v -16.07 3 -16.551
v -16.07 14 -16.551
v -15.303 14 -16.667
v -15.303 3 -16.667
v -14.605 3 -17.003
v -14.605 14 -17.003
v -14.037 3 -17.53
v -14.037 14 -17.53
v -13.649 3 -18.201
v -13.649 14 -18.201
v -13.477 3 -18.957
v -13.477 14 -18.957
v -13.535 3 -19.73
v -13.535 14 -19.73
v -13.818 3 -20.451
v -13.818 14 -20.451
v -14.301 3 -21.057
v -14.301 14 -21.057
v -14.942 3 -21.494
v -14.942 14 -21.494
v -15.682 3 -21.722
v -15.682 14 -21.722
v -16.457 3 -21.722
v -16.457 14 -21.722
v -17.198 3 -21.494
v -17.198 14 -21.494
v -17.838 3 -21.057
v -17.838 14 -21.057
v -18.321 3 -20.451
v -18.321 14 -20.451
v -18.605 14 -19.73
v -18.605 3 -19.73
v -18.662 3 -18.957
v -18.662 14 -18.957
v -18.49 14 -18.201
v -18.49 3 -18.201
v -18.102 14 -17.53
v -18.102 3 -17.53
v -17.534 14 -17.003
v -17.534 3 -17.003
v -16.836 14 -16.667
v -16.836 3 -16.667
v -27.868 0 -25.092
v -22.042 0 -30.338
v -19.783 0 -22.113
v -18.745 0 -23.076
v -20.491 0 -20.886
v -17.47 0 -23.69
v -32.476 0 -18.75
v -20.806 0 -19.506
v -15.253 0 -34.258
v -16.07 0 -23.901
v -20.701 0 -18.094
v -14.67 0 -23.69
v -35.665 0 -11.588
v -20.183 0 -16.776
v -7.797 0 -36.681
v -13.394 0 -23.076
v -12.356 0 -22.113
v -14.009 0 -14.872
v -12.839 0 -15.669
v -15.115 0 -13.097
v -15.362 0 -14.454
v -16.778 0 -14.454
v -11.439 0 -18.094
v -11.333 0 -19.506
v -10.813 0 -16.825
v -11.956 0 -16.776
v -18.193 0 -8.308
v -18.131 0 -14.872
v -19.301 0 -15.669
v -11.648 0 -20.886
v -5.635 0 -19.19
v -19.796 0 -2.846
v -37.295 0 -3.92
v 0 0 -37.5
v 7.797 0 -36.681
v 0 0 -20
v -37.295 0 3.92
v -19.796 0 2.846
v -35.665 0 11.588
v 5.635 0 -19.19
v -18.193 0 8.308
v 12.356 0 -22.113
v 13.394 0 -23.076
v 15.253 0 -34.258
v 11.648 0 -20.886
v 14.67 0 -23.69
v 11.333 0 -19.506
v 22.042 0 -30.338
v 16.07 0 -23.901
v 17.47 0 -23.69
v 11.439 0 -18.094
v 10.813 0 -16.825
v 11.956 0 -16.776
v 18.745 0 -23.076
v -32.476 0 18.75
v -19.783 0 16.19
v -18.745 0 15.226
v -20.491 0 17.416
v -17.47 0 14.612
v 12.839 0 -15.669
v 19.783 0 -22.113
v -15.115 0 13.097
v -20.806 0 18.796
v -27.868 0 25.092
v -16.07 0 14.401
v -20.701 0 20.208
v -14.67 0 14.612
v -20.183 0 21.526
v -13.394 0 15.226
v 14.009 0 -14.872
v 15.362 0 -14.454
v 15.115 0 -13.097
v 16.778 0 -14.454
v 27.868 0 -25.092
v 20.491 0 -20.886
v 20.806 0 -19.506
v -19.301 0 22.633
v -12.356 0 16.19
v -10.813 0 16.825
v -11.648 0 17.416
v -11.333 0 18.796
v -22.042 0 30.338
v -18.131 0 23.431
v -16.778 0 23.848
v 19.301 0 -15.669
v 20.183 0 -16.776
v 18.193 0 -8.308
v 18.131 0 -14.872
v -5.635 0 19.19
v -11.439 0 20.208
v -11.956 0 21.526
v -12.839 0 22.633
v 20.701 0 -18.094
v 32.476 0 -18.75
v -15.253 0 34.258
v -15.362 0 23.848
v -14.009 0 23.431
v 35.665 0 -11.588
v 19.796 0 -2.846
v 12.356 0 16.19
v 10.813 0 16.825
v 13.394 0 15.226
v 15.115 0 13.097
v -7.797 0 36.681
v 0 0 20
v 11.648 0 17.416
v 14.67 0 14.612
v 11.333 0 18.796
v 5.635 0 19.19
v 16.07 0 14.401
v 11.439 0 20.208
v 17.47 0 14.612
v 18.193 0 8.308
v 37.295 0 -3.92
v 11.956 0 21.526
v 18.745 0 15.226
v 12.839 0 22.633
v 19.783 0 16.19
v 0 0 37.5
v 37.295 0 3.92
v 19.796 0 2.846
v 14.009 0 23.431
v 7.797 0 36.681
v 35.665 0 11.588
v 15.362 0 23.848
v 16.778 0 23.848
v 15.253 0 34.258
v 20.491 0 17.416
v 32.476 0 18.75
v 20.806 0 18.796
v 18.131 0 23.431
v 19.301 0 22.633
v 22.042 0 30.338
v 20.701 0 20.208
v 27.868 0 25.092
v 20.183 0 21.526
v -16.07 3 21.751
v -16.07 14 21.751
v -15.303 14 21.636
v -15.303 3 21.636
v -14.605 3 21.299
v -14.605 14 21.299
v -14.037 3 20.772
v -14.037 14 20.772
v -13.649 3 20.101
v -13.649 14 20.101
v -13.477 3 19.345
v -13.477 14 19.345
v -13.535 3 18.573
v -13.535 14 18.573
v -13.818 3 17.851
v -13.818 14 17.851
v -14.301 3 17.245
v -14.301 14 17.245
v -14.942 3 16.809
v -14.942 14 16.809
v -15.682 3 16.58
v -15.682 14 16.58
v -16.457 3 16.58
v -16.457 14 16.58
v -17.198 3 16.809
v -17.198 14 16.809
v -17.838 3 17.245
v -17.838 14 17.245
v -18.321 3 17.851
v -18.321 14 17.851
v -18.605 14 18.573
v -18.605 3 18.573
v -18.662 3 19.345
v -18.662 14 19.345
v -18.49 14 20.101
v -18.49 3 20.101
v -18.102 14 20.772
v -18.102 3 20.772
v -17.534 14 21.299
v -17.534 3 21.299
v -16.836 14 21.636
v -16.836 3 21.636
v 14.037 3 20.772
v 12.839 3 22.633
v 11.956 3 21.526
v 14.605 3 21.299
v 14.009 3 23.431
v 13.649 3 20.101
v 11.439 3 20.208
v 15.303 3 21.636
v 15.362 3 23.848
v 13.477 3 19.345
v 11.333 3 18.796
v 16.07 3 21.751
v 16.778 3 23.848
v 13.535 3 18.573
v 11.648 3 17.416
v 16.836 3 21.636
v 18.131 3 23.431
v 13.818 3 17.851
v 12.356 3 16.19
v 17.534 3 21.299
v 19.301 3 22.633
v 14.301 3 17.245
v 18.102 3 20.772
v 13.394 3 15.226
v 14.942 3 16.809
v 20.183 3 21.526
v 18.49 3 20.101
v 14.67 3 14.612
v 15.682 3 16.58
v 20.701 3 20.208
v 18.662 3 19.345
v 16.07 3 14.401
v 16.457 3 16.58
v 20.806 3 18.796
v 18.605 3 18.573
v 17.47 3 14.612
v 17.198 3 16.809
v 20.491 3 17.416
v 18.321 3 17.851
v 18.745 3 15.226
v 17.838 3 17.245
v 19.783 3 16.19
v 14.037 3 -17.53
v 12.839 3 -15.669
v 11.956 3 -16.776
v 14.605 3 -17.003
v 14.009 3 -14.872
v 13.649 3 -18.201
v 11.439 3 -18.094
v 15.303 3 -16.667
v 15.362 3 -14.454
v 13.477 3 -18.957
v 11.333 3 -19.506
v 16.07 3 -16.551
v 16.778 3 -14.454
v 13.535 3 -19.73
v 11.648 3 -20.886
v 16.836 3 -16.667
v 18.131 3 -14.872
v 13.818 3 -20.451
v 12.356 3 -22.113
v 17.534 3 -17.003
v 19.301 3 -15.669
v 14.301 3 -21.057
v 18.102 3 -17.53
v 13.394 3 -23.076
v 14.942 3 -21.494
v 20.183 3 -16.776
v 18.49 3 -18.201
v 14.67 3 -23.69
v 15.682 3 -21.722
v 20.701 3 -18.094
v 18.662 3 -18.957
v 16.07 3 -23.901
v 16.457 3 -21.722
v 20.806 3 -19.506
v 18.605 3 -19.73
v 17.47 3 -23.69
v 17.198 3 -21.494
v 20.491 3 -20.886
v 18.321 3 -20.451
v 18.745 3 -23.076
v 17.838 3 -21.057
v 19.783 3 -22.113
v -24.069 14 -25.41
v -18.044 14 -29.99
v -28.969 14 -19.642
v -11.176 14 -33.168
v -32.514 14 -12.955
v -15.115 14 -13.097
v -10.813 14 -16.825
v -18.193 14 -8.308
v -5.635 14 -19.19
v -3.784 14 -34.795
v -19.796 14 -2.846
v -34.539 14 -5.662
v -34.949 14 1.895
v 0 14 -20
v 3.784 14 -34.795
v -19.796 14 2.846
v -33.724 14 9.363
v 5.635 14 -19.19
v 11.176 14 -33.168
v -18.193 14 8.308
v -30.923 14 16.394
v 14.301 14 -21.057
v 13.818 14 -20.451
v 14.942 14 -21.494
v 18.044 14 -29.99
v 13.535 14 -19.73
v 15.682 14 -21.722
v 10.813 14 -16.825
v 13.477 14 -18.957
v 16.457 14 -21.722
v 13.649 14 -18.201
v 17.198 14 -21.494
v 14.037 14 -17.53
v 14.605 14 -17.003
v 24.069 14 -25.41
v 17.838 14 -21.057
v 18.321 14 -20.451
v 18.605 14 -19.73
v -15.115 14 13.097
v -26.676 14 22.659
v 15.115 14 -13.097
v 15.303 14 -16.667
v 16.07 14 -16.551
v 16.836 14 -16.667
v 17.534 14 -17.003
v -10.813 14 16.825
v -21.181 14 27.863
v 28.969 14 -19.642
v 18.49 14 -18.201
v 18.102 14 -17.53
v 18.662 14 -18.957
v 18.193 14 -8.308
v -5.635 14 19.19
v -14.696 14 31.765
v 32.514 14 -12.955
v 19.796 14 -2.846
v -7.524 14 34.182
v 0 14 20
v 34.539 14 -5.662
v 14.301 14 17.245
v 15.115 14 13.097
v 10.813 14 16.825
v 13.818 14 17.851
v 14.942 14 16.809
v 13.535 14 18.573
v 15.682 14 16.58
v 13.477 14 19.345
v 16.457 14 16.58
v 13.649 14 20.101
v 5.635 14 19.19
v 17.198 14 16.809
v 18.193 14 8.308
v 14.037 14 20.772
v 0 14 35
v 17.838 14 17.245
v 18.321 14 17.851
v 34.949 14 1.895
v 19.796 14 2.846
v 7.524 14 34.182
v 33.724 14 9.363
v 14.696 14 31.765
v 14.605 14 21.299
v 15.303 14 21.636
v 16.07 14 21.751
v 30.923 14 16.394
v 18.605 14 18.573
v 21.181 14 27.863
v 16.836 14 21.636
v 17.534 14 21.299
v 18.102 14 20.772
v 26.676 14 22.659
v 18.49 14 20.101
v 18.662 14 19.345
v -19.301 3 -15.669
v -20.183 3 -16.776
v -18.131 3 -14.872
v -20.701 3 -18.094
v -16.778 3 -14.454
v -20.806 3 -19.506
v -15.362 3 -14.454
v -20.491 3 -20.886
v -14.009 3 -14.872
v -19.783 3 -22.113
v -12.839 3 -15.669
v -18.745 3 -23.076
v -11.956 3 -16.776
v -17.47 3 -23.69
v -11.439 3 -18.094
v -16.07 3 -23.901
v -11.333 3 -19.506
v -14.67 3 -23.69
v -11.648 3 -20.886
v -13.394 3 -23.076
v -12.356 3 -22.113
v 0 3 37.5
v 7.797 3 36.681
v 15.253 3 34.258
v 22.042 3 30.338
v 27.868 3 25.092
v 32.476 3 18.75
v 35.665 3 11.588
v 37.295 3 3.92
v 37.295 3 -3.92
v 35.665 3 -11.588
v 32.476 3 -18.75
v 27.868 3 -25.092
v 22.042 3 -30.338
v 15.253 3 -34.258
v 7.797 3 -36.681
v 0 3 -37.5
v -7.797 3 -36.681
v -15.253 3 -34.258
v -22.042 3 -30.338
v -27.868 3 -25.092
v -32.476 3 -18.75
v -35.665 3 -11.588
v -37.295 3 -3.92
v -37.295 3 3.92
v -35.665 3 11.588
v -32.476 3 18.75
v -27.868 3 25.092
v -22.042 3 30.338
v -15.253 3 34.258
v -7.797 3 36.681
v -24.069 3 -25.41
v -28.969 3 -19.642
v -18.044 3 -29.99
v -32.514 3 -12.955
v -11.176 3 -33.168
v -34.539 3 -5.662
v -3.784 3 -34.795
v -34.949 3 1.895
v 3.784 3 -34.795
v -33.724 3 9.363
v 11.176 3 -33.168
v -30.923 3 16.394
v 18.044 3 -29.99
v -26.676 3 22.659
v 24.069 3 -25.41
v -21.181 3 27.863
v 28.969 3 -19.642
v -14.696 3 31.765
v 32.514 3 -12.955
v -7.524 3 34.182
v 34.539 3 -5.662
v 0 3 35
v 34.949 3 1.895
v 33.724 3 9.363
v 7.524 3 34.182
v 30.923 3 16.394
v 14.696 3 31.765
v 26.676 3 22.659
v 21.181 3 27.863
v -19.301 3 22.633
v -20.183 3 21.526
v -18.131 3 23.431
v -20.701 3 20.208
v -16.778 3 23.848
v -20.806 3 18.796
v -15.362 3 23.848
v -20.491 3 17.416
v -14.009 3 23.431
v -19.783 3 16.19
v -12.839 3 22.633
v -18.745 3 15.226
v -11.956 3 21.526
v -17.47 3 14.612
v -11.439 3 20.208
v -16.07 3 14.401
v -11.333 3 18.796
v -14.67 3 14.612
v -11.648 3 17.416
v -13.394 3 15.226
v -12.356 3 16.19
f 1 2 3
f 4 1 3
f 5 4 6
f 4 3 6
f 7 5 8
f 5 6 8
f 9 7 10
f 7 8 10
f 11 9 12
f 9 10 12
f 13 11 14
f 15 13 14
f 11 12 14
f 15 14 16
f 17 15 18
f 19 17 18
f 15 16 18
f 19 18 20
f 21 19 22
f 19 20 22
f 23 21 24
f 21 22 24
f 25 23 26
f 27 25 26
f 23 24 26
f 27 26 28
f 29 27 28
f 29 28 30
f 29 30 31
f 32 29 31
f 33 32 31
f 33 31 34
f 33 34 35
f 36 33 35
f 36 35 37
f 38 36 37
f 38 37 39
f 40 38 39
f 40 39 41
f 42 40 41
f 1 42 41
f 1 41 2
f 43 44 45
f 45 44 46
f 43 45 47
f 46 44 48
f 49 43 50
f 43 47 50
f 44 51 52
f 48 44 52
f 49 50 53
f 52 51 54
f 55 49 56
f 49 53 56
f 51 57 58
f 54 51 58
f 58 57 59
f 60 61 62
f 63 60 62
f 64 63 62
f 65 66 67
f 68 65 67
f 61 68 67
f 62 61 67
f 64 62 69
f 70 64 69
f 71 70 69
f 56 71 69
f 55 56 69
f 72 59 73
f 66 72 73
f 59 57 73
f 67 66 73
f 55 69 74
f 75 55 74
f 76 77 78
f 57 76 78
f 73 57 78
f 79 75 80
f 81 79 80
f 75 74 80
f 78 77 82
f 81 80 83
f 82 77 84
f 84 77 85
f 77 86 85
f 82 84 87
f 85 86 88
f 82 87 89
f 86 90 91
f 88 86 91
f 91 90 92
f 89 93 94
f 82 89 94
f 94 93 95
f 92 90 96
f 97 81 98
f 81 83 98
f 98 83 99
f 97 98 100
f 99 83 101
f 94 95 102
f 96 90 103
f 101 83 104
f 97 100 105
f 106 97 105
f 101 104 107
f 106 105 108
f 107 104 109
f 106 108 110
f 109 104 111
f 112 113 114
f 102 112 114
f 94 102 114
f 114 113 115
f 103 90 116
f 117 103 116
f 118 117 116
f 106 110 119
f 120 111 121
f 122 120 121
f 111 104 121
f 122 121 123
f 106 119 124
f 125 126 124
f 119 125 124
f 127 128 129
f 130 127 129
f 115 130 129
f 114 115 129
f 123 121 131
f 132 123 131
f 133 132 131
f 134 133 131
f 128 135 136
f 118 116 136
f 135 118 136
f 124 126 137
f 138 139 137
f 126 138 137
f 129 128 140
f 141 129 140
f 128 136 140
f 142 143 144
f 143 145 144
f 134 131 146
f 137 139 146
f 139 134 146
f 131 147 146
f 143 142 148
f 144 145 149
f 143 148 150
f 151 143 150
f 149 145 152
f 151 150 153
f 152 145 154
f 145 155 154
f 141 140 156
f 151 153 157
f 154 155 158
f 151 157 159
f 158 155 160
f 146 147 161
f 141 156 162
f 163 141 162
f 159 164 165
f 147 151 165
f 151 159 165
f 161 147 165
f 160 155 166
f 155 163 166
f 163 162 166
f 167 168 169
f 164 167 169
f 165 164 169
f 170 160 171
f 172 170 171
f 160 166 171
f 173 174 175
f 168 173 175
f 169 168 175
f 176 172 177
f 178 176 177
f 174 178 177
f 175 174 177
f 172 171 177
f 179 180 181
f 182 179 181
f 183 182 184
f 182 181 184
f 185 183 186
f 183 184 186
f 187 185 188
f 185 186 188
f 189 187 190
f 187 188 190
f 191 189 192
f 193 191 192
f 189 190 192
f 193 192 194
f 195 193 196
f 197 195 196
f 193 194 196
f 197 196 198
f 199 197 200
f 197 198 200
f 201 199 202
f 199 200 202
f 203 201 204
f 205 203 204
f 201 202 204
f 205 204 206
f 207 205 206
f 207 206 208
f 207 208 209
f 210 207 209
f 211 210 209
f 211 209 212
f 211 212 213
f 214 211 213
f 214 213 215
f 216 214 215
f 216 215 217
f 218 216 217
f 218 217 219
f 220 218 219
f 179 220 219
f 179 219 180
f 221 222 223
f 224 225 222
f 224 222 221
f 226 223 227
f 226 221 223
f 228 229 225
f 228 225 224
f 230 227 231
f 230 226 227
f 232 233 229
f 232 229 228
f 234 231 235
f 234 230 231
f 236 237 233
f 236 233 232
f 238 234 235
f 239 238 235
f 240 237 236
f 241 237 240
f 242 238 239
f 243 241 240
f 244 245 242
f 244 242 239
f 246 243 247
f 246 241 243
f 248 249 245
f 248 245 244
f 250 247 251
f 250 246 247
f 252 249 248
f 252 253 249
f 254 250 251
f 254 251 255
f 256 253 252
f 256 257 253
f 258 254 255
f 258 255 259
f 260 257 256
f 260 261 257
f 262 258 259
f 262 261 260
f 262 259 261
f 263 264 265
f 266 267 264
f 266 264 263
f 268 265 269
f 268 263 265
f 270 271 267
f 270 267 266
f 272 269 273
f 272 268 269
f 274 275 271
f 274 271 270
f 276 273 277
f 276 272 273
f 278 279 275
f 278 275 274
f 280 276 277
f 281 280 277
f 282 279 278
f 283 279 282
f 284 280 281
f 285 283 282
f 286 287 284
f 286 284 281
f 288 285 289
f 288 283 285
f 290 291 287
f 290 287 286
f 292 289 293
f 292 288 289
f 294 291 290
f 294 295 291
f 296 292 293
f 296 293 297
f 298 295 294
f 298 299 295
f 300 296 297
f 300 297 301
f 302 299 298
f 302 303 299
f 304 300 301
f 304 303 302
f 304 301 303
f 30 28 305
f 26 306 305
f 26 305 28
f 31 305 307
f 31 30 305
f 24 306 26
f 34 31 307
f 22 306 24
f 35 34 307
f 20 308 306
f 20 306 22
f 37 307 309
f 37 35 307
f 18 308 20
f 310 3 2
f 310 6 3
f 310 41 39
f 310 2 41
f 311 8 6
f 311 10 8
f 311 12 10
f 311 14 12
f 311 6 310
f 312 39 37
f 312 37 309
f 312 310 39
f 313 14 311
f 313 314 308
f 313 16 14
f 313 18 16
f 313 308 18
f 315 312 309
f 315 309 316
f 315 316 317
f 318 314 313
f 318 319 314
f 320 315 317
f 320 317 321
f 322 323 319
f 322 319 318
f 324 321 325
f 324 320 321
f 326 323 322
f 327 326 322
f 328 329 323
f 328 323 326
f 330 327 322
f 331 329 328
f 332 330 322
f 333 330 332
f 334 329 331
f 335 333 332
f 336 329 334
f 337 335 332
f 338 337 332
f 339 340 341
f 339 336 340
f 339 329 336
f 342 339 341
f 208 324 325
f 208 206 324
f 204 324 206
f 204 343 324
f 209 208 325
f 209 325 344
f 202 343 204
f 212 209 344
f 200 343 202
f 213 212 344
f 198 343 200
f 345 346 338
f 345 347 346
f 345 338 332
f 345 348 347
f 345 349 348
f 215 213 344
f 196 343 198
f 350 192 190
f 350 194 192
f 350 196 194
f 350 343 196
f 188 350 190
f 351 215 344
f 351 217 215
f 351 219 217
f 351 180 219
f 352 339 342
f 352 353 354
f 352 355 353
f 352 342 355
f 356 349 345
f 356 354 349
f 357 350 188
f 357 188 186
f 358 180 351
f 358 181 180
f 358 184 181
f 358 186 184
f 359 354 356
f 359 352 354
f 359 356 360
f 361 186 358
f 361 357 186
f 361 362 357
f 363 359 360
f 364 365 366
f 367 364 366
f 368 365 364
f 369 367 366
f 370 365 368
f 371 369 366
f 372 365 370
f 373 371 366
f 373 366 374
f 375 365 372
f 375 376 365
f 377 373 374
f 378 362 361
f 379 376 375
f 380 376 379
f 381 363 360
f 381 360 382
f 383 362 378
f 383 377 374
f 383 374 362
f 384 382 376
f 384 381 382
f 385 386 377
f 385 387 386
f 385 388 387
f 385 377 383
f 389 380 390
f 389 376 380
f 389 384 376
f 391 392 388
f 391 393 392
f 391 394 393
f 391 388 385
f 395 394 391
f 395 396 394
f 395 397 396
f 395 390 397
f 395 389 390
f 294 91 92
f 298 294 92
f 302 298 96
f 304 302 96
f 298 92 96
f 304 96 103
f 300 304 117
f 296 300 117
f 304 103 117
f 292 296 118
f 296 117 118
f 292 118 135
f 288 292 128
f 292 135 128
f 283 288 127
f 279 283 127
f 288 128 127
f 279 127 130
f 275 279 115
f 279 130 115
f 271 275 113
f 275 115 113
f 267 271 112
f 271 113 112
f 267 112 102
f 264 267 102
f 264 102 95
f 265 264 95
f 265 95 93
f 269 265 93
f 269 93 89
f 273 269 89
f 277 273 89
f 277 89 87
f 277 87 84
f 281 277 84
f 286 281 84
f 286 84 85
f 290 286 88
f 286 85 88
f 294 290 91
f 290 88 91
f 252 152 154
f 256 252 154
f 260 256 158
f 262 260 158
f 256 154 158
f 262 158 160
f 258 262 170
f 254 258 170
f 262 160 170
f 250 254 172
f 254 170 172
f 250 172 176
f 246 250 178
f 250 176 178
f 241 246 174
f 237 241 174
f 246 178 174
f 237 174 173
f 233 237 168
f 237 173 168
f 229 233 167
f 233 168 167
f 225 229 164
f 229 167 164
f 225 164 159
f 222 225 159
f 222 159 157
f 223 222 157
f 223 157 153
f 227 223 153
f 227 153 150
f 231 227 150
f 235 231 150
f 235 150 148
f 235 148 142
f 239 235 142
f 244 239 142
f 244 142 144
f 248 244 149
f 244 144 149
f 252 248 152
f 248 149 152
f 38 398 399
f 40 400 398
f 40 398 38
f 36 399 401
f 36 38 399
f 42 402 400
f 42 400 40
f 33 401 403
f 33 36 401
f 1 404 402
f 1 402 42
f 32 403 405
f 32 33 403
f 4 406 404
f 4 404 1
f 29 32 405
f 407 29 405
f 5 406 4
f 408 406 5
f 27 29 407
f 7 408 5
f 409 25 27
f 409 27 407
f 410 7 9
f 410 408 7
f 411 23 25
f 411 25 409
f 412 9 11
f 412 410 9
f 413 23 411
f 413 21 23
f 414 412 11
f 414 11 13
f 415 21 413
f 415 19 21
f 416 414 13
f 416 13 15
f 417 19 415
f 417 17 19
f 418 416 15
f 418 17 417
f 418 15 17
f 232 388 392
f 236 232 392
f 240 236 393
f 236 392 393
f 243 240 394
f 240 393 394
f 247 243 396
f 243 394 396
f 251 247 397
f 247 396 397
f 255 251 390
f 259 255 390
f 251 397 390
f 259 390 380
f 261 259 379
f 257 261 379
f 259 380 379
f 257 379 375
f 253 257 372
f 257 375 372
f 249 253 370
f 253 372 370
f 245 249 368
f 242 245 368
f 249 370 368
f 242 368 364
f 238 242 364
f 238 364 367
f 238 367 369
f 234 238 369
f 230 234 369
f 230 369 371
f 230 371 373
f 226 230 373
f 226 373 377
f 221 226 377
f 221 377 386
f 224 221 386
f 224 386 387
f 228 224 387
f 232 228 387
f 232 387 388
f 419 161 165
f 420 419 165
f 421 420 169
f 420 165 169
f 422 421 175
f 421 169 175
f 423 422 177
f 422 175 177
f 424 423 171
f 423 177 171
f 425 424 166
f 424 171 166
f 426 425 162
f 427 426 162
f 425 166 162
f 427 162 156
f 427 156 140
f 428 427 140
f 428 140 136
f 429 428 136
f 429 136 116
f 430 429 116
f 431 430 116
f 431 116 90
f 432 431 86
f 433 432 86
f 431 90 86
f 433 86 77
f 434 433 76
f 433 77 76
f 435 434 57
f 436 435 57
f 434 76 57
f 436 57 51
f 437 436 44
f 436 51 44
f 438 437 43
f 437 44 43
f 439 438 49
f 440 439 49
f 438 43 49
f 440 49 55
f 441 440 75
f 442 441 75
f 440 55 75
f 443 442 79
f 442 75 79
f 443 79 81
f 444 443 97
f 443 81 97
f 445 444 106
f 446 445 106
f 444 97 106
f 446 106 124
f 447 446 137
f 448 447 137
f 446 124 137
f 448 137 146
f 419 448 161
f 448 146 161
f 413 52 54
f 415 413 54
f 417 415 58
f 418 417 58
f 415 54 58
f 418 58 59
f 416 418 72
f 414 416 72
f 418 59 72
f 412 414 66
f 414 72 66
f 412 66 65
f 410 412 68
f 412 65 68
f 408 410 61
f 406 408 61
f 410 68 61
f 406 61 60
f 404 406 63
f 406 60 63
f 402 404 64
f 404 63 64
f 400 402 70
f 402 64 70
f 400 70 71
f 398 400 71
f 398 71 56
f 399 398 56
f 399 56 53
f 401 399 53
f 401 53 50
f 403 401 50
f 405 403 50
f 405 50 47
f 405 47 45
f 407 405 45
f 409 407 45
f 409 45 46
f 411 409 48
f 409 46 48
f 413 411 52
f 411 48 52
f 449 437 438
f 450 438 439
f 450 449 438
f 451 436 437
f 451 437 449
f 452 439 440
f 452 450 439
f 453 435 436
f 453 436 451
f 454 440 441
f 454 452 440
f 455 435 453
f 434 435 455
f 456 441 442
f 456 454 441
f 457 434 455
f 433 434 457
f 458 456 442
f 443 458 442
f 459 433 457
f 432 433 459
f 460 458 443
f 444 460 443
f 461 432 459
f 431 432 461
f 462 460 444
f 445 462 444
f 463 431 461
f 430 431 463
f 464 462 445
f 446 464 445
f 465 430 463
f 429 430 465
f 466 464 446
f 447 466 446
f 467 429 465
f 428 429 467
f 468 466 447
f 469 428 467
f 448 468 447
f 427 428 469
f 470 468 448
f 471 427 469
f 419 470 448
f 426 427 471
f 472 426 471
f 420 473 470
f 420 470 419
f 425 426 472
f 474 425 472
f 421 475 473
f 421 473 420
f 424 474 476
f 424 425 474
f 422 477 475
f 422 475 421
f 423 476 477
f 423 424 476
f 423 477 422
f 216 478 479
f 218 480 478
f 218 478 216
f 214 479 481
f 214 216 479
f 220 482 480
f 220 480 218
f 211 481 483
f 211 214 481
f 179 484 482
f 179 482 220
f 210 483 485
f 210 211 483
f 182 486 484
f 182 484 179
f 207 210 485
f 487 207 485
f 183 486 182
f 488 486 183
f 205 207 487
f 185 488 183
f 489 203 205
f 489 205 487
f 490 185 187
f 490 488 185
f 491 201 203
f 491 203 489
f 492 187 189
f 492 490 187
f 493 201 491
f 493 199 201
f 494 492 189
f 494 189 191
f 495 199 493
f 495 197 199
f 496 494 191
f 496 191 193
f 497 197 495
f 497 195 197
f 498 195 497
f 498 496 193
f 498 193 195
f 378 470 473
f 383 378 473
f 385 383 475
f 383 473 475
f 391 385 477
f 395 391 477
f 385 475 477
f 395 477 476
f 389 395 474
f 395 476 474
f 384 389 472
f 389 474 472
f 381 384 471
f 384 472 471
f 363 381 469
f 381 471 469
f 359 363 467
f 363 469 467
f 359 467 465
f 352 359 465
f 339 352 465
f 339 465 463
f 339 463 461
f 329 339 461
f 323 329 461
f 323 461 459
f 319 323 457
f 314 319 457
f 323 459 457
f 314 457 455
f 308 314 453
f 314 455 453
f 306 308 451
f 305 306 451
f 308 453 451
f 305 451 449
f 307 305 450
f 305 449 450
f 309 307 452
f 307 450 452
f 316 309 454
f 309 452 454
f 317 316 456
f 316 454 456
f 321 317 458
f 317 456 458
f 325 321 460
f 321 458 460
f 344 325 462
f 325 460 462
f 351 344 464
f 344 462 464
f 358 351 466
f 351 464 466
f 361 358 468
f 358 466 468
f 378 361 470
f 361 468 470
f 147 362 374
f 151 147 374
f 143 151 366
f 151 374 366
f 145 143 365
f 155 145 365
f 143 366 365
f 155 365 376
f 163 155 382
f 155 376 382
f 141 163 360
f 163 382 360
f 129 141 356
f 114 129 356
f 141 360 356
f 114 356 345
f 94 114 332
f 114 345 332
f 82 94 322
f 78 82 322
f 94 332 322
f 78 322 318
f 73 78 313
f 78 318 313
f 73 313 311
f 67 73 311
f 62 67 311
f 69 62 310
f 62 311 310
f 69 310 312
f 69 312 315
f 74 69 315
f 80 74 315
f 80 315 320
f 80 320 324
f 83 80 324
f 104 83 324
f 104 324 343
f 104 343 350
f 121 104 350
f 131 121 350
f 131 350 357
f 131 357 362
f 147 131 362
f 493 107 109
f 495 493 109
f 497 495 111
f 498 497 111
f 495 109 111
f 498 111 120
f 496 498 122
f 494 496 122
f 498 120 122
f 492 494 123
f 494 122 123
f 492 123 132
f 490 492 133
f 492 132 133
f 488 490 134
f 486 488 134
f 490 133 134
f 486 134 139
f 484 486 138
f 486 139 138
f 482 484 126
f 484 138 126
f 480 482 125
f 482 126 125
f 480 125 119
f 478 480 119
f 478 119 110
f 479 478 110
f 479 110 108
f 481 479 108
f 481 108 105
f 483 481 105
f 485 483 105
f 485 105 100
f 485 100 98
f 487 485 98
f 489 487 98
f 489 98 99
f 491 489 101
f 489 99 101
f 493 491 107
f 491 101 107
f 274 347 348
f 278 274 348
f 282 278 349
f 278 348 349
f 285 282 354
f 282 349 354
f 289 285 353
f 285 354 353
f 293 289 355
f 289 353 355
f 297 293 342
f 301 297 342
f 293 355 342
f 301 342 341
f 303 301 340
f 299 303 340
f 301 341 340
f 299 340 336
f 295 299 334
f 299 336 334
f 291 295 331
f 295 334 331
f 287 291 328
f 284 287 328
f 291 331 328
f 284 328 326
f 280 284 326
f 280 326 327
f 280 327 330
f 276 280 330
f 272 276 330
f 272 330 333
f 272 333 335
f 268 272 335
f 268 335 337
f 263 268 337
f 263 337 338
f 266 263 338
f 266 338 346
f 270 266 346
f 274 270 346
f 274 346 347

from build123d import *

# Parameters (mm, degrees)
SKETCH1_R           = 37.5
BOSS_EXTRUDE1_DEPTH = 3
SKETCH2_R           = 35
BOSS_EXTRUDE2_DEPTH = 11
SKETCH4_R           = 2.6
CUT_EXTRUDE2_DEPTH  = 55.849794895
SKETCH5_R           = 20
CUT_EXTRUDE3_DEPTH  = 55.849794895
SKETCH6_R           = 4.75
CUT_EXTRUDE4_DEPTH  = 3


with BuildPart() as part:
    # Sketch1 → Boss-Extrude1 (new body)
    with BuildSketch(Plane(origin=(0, 0, 0), x_dir=(1, 0, 0), z_dir=(0, 1, 0))):
        with Locations(Location((0, 0, 0), (0, 0, 270))):
            Circle(SKETCH1_R)
    extrude(amount=BOSS_EXTRUDE1_DEPTH)

    # Sketch2 → Boss-Extrude2 (add)
    with BuildSketch(Plane(origin=(0, 3, 0), x_dir=(1, 0, 0), z_dir=(0, 1, 0))):
        with Locations(Location((0, 0, 0), (0, 0, 270))):
            Circle(SKETCH2_R)
    extrude(amount=BOSS_EXTRUDE2_DEPTH)

    # Sketch4 → Cut-Extrude2 (cut, through all)
    with BuildSketch(Plane(origin=(0, 14, 0), x_dir=(1, 0, 0), z_dir=(0, 1, 0))):
        with Locations(Location((-16.069690242, 19.151111078, 0), (0, 0, 270))):
            Circle(SKETCH4_R)
        with Locations(Location((16.069690242, 19.151111078, 0), (0, 0, 270))):
            Circle(SKETCH4_R)
        with Locations(Location((16.069690242, -19.151111078, 0), (0, 0, 270))):
            Circle(SKETCH4_R)
        with Locations(Location((-16.069690242, -19.151111078, 0), (0, 0, 270))):
            Circle(SKETCH4_R)
    extrude(amount=-CUT_EXTRUDE2_DEPTH, mode=Mode.SUBTRACT)

    # Sketch5 → Cut-Extrude3 (cut, through all)
    with BuildSketch(Plane(origin=(0, 14, 0), x_dir=(1, 0, 0), z_dir=(0, 1, 0))):
        with Locations(Location((0, 0, 0), (0, 0, 270))):
            Circle(SKETCH5_R)
    extrude(amount=-CUT_EXTRUDE3_DEPTH, mode=Mode.SUBTRACT)

    # Sketch6 → Cut-Extrude4 (cut)
    with BuildSketch(Plane.XZ):
        with Locations(Location((16.069690242, -19.151111078, 0), (0, 0, 270))):
            Circle(SKETCH6_R)
        with Locations(Location((-16.069690242, -19.151111078, 0), (0, 0, 270))):
            Circle(SKETCH6_R)
        with Locations(Location((16.069690242, 19.151111078, 0), (0, 0, 270))):
            Circle(SKETCH6_R)
        with Locations(Location((-16.069690242, 19.151111078, 0), (0, 0, 270))):
            Circle(SKETCH6_R)
    extrude(amount=-CUT_EXTRUDE4_DEPTH, mode=Mode.SUBTRACT)


solid = part.part
